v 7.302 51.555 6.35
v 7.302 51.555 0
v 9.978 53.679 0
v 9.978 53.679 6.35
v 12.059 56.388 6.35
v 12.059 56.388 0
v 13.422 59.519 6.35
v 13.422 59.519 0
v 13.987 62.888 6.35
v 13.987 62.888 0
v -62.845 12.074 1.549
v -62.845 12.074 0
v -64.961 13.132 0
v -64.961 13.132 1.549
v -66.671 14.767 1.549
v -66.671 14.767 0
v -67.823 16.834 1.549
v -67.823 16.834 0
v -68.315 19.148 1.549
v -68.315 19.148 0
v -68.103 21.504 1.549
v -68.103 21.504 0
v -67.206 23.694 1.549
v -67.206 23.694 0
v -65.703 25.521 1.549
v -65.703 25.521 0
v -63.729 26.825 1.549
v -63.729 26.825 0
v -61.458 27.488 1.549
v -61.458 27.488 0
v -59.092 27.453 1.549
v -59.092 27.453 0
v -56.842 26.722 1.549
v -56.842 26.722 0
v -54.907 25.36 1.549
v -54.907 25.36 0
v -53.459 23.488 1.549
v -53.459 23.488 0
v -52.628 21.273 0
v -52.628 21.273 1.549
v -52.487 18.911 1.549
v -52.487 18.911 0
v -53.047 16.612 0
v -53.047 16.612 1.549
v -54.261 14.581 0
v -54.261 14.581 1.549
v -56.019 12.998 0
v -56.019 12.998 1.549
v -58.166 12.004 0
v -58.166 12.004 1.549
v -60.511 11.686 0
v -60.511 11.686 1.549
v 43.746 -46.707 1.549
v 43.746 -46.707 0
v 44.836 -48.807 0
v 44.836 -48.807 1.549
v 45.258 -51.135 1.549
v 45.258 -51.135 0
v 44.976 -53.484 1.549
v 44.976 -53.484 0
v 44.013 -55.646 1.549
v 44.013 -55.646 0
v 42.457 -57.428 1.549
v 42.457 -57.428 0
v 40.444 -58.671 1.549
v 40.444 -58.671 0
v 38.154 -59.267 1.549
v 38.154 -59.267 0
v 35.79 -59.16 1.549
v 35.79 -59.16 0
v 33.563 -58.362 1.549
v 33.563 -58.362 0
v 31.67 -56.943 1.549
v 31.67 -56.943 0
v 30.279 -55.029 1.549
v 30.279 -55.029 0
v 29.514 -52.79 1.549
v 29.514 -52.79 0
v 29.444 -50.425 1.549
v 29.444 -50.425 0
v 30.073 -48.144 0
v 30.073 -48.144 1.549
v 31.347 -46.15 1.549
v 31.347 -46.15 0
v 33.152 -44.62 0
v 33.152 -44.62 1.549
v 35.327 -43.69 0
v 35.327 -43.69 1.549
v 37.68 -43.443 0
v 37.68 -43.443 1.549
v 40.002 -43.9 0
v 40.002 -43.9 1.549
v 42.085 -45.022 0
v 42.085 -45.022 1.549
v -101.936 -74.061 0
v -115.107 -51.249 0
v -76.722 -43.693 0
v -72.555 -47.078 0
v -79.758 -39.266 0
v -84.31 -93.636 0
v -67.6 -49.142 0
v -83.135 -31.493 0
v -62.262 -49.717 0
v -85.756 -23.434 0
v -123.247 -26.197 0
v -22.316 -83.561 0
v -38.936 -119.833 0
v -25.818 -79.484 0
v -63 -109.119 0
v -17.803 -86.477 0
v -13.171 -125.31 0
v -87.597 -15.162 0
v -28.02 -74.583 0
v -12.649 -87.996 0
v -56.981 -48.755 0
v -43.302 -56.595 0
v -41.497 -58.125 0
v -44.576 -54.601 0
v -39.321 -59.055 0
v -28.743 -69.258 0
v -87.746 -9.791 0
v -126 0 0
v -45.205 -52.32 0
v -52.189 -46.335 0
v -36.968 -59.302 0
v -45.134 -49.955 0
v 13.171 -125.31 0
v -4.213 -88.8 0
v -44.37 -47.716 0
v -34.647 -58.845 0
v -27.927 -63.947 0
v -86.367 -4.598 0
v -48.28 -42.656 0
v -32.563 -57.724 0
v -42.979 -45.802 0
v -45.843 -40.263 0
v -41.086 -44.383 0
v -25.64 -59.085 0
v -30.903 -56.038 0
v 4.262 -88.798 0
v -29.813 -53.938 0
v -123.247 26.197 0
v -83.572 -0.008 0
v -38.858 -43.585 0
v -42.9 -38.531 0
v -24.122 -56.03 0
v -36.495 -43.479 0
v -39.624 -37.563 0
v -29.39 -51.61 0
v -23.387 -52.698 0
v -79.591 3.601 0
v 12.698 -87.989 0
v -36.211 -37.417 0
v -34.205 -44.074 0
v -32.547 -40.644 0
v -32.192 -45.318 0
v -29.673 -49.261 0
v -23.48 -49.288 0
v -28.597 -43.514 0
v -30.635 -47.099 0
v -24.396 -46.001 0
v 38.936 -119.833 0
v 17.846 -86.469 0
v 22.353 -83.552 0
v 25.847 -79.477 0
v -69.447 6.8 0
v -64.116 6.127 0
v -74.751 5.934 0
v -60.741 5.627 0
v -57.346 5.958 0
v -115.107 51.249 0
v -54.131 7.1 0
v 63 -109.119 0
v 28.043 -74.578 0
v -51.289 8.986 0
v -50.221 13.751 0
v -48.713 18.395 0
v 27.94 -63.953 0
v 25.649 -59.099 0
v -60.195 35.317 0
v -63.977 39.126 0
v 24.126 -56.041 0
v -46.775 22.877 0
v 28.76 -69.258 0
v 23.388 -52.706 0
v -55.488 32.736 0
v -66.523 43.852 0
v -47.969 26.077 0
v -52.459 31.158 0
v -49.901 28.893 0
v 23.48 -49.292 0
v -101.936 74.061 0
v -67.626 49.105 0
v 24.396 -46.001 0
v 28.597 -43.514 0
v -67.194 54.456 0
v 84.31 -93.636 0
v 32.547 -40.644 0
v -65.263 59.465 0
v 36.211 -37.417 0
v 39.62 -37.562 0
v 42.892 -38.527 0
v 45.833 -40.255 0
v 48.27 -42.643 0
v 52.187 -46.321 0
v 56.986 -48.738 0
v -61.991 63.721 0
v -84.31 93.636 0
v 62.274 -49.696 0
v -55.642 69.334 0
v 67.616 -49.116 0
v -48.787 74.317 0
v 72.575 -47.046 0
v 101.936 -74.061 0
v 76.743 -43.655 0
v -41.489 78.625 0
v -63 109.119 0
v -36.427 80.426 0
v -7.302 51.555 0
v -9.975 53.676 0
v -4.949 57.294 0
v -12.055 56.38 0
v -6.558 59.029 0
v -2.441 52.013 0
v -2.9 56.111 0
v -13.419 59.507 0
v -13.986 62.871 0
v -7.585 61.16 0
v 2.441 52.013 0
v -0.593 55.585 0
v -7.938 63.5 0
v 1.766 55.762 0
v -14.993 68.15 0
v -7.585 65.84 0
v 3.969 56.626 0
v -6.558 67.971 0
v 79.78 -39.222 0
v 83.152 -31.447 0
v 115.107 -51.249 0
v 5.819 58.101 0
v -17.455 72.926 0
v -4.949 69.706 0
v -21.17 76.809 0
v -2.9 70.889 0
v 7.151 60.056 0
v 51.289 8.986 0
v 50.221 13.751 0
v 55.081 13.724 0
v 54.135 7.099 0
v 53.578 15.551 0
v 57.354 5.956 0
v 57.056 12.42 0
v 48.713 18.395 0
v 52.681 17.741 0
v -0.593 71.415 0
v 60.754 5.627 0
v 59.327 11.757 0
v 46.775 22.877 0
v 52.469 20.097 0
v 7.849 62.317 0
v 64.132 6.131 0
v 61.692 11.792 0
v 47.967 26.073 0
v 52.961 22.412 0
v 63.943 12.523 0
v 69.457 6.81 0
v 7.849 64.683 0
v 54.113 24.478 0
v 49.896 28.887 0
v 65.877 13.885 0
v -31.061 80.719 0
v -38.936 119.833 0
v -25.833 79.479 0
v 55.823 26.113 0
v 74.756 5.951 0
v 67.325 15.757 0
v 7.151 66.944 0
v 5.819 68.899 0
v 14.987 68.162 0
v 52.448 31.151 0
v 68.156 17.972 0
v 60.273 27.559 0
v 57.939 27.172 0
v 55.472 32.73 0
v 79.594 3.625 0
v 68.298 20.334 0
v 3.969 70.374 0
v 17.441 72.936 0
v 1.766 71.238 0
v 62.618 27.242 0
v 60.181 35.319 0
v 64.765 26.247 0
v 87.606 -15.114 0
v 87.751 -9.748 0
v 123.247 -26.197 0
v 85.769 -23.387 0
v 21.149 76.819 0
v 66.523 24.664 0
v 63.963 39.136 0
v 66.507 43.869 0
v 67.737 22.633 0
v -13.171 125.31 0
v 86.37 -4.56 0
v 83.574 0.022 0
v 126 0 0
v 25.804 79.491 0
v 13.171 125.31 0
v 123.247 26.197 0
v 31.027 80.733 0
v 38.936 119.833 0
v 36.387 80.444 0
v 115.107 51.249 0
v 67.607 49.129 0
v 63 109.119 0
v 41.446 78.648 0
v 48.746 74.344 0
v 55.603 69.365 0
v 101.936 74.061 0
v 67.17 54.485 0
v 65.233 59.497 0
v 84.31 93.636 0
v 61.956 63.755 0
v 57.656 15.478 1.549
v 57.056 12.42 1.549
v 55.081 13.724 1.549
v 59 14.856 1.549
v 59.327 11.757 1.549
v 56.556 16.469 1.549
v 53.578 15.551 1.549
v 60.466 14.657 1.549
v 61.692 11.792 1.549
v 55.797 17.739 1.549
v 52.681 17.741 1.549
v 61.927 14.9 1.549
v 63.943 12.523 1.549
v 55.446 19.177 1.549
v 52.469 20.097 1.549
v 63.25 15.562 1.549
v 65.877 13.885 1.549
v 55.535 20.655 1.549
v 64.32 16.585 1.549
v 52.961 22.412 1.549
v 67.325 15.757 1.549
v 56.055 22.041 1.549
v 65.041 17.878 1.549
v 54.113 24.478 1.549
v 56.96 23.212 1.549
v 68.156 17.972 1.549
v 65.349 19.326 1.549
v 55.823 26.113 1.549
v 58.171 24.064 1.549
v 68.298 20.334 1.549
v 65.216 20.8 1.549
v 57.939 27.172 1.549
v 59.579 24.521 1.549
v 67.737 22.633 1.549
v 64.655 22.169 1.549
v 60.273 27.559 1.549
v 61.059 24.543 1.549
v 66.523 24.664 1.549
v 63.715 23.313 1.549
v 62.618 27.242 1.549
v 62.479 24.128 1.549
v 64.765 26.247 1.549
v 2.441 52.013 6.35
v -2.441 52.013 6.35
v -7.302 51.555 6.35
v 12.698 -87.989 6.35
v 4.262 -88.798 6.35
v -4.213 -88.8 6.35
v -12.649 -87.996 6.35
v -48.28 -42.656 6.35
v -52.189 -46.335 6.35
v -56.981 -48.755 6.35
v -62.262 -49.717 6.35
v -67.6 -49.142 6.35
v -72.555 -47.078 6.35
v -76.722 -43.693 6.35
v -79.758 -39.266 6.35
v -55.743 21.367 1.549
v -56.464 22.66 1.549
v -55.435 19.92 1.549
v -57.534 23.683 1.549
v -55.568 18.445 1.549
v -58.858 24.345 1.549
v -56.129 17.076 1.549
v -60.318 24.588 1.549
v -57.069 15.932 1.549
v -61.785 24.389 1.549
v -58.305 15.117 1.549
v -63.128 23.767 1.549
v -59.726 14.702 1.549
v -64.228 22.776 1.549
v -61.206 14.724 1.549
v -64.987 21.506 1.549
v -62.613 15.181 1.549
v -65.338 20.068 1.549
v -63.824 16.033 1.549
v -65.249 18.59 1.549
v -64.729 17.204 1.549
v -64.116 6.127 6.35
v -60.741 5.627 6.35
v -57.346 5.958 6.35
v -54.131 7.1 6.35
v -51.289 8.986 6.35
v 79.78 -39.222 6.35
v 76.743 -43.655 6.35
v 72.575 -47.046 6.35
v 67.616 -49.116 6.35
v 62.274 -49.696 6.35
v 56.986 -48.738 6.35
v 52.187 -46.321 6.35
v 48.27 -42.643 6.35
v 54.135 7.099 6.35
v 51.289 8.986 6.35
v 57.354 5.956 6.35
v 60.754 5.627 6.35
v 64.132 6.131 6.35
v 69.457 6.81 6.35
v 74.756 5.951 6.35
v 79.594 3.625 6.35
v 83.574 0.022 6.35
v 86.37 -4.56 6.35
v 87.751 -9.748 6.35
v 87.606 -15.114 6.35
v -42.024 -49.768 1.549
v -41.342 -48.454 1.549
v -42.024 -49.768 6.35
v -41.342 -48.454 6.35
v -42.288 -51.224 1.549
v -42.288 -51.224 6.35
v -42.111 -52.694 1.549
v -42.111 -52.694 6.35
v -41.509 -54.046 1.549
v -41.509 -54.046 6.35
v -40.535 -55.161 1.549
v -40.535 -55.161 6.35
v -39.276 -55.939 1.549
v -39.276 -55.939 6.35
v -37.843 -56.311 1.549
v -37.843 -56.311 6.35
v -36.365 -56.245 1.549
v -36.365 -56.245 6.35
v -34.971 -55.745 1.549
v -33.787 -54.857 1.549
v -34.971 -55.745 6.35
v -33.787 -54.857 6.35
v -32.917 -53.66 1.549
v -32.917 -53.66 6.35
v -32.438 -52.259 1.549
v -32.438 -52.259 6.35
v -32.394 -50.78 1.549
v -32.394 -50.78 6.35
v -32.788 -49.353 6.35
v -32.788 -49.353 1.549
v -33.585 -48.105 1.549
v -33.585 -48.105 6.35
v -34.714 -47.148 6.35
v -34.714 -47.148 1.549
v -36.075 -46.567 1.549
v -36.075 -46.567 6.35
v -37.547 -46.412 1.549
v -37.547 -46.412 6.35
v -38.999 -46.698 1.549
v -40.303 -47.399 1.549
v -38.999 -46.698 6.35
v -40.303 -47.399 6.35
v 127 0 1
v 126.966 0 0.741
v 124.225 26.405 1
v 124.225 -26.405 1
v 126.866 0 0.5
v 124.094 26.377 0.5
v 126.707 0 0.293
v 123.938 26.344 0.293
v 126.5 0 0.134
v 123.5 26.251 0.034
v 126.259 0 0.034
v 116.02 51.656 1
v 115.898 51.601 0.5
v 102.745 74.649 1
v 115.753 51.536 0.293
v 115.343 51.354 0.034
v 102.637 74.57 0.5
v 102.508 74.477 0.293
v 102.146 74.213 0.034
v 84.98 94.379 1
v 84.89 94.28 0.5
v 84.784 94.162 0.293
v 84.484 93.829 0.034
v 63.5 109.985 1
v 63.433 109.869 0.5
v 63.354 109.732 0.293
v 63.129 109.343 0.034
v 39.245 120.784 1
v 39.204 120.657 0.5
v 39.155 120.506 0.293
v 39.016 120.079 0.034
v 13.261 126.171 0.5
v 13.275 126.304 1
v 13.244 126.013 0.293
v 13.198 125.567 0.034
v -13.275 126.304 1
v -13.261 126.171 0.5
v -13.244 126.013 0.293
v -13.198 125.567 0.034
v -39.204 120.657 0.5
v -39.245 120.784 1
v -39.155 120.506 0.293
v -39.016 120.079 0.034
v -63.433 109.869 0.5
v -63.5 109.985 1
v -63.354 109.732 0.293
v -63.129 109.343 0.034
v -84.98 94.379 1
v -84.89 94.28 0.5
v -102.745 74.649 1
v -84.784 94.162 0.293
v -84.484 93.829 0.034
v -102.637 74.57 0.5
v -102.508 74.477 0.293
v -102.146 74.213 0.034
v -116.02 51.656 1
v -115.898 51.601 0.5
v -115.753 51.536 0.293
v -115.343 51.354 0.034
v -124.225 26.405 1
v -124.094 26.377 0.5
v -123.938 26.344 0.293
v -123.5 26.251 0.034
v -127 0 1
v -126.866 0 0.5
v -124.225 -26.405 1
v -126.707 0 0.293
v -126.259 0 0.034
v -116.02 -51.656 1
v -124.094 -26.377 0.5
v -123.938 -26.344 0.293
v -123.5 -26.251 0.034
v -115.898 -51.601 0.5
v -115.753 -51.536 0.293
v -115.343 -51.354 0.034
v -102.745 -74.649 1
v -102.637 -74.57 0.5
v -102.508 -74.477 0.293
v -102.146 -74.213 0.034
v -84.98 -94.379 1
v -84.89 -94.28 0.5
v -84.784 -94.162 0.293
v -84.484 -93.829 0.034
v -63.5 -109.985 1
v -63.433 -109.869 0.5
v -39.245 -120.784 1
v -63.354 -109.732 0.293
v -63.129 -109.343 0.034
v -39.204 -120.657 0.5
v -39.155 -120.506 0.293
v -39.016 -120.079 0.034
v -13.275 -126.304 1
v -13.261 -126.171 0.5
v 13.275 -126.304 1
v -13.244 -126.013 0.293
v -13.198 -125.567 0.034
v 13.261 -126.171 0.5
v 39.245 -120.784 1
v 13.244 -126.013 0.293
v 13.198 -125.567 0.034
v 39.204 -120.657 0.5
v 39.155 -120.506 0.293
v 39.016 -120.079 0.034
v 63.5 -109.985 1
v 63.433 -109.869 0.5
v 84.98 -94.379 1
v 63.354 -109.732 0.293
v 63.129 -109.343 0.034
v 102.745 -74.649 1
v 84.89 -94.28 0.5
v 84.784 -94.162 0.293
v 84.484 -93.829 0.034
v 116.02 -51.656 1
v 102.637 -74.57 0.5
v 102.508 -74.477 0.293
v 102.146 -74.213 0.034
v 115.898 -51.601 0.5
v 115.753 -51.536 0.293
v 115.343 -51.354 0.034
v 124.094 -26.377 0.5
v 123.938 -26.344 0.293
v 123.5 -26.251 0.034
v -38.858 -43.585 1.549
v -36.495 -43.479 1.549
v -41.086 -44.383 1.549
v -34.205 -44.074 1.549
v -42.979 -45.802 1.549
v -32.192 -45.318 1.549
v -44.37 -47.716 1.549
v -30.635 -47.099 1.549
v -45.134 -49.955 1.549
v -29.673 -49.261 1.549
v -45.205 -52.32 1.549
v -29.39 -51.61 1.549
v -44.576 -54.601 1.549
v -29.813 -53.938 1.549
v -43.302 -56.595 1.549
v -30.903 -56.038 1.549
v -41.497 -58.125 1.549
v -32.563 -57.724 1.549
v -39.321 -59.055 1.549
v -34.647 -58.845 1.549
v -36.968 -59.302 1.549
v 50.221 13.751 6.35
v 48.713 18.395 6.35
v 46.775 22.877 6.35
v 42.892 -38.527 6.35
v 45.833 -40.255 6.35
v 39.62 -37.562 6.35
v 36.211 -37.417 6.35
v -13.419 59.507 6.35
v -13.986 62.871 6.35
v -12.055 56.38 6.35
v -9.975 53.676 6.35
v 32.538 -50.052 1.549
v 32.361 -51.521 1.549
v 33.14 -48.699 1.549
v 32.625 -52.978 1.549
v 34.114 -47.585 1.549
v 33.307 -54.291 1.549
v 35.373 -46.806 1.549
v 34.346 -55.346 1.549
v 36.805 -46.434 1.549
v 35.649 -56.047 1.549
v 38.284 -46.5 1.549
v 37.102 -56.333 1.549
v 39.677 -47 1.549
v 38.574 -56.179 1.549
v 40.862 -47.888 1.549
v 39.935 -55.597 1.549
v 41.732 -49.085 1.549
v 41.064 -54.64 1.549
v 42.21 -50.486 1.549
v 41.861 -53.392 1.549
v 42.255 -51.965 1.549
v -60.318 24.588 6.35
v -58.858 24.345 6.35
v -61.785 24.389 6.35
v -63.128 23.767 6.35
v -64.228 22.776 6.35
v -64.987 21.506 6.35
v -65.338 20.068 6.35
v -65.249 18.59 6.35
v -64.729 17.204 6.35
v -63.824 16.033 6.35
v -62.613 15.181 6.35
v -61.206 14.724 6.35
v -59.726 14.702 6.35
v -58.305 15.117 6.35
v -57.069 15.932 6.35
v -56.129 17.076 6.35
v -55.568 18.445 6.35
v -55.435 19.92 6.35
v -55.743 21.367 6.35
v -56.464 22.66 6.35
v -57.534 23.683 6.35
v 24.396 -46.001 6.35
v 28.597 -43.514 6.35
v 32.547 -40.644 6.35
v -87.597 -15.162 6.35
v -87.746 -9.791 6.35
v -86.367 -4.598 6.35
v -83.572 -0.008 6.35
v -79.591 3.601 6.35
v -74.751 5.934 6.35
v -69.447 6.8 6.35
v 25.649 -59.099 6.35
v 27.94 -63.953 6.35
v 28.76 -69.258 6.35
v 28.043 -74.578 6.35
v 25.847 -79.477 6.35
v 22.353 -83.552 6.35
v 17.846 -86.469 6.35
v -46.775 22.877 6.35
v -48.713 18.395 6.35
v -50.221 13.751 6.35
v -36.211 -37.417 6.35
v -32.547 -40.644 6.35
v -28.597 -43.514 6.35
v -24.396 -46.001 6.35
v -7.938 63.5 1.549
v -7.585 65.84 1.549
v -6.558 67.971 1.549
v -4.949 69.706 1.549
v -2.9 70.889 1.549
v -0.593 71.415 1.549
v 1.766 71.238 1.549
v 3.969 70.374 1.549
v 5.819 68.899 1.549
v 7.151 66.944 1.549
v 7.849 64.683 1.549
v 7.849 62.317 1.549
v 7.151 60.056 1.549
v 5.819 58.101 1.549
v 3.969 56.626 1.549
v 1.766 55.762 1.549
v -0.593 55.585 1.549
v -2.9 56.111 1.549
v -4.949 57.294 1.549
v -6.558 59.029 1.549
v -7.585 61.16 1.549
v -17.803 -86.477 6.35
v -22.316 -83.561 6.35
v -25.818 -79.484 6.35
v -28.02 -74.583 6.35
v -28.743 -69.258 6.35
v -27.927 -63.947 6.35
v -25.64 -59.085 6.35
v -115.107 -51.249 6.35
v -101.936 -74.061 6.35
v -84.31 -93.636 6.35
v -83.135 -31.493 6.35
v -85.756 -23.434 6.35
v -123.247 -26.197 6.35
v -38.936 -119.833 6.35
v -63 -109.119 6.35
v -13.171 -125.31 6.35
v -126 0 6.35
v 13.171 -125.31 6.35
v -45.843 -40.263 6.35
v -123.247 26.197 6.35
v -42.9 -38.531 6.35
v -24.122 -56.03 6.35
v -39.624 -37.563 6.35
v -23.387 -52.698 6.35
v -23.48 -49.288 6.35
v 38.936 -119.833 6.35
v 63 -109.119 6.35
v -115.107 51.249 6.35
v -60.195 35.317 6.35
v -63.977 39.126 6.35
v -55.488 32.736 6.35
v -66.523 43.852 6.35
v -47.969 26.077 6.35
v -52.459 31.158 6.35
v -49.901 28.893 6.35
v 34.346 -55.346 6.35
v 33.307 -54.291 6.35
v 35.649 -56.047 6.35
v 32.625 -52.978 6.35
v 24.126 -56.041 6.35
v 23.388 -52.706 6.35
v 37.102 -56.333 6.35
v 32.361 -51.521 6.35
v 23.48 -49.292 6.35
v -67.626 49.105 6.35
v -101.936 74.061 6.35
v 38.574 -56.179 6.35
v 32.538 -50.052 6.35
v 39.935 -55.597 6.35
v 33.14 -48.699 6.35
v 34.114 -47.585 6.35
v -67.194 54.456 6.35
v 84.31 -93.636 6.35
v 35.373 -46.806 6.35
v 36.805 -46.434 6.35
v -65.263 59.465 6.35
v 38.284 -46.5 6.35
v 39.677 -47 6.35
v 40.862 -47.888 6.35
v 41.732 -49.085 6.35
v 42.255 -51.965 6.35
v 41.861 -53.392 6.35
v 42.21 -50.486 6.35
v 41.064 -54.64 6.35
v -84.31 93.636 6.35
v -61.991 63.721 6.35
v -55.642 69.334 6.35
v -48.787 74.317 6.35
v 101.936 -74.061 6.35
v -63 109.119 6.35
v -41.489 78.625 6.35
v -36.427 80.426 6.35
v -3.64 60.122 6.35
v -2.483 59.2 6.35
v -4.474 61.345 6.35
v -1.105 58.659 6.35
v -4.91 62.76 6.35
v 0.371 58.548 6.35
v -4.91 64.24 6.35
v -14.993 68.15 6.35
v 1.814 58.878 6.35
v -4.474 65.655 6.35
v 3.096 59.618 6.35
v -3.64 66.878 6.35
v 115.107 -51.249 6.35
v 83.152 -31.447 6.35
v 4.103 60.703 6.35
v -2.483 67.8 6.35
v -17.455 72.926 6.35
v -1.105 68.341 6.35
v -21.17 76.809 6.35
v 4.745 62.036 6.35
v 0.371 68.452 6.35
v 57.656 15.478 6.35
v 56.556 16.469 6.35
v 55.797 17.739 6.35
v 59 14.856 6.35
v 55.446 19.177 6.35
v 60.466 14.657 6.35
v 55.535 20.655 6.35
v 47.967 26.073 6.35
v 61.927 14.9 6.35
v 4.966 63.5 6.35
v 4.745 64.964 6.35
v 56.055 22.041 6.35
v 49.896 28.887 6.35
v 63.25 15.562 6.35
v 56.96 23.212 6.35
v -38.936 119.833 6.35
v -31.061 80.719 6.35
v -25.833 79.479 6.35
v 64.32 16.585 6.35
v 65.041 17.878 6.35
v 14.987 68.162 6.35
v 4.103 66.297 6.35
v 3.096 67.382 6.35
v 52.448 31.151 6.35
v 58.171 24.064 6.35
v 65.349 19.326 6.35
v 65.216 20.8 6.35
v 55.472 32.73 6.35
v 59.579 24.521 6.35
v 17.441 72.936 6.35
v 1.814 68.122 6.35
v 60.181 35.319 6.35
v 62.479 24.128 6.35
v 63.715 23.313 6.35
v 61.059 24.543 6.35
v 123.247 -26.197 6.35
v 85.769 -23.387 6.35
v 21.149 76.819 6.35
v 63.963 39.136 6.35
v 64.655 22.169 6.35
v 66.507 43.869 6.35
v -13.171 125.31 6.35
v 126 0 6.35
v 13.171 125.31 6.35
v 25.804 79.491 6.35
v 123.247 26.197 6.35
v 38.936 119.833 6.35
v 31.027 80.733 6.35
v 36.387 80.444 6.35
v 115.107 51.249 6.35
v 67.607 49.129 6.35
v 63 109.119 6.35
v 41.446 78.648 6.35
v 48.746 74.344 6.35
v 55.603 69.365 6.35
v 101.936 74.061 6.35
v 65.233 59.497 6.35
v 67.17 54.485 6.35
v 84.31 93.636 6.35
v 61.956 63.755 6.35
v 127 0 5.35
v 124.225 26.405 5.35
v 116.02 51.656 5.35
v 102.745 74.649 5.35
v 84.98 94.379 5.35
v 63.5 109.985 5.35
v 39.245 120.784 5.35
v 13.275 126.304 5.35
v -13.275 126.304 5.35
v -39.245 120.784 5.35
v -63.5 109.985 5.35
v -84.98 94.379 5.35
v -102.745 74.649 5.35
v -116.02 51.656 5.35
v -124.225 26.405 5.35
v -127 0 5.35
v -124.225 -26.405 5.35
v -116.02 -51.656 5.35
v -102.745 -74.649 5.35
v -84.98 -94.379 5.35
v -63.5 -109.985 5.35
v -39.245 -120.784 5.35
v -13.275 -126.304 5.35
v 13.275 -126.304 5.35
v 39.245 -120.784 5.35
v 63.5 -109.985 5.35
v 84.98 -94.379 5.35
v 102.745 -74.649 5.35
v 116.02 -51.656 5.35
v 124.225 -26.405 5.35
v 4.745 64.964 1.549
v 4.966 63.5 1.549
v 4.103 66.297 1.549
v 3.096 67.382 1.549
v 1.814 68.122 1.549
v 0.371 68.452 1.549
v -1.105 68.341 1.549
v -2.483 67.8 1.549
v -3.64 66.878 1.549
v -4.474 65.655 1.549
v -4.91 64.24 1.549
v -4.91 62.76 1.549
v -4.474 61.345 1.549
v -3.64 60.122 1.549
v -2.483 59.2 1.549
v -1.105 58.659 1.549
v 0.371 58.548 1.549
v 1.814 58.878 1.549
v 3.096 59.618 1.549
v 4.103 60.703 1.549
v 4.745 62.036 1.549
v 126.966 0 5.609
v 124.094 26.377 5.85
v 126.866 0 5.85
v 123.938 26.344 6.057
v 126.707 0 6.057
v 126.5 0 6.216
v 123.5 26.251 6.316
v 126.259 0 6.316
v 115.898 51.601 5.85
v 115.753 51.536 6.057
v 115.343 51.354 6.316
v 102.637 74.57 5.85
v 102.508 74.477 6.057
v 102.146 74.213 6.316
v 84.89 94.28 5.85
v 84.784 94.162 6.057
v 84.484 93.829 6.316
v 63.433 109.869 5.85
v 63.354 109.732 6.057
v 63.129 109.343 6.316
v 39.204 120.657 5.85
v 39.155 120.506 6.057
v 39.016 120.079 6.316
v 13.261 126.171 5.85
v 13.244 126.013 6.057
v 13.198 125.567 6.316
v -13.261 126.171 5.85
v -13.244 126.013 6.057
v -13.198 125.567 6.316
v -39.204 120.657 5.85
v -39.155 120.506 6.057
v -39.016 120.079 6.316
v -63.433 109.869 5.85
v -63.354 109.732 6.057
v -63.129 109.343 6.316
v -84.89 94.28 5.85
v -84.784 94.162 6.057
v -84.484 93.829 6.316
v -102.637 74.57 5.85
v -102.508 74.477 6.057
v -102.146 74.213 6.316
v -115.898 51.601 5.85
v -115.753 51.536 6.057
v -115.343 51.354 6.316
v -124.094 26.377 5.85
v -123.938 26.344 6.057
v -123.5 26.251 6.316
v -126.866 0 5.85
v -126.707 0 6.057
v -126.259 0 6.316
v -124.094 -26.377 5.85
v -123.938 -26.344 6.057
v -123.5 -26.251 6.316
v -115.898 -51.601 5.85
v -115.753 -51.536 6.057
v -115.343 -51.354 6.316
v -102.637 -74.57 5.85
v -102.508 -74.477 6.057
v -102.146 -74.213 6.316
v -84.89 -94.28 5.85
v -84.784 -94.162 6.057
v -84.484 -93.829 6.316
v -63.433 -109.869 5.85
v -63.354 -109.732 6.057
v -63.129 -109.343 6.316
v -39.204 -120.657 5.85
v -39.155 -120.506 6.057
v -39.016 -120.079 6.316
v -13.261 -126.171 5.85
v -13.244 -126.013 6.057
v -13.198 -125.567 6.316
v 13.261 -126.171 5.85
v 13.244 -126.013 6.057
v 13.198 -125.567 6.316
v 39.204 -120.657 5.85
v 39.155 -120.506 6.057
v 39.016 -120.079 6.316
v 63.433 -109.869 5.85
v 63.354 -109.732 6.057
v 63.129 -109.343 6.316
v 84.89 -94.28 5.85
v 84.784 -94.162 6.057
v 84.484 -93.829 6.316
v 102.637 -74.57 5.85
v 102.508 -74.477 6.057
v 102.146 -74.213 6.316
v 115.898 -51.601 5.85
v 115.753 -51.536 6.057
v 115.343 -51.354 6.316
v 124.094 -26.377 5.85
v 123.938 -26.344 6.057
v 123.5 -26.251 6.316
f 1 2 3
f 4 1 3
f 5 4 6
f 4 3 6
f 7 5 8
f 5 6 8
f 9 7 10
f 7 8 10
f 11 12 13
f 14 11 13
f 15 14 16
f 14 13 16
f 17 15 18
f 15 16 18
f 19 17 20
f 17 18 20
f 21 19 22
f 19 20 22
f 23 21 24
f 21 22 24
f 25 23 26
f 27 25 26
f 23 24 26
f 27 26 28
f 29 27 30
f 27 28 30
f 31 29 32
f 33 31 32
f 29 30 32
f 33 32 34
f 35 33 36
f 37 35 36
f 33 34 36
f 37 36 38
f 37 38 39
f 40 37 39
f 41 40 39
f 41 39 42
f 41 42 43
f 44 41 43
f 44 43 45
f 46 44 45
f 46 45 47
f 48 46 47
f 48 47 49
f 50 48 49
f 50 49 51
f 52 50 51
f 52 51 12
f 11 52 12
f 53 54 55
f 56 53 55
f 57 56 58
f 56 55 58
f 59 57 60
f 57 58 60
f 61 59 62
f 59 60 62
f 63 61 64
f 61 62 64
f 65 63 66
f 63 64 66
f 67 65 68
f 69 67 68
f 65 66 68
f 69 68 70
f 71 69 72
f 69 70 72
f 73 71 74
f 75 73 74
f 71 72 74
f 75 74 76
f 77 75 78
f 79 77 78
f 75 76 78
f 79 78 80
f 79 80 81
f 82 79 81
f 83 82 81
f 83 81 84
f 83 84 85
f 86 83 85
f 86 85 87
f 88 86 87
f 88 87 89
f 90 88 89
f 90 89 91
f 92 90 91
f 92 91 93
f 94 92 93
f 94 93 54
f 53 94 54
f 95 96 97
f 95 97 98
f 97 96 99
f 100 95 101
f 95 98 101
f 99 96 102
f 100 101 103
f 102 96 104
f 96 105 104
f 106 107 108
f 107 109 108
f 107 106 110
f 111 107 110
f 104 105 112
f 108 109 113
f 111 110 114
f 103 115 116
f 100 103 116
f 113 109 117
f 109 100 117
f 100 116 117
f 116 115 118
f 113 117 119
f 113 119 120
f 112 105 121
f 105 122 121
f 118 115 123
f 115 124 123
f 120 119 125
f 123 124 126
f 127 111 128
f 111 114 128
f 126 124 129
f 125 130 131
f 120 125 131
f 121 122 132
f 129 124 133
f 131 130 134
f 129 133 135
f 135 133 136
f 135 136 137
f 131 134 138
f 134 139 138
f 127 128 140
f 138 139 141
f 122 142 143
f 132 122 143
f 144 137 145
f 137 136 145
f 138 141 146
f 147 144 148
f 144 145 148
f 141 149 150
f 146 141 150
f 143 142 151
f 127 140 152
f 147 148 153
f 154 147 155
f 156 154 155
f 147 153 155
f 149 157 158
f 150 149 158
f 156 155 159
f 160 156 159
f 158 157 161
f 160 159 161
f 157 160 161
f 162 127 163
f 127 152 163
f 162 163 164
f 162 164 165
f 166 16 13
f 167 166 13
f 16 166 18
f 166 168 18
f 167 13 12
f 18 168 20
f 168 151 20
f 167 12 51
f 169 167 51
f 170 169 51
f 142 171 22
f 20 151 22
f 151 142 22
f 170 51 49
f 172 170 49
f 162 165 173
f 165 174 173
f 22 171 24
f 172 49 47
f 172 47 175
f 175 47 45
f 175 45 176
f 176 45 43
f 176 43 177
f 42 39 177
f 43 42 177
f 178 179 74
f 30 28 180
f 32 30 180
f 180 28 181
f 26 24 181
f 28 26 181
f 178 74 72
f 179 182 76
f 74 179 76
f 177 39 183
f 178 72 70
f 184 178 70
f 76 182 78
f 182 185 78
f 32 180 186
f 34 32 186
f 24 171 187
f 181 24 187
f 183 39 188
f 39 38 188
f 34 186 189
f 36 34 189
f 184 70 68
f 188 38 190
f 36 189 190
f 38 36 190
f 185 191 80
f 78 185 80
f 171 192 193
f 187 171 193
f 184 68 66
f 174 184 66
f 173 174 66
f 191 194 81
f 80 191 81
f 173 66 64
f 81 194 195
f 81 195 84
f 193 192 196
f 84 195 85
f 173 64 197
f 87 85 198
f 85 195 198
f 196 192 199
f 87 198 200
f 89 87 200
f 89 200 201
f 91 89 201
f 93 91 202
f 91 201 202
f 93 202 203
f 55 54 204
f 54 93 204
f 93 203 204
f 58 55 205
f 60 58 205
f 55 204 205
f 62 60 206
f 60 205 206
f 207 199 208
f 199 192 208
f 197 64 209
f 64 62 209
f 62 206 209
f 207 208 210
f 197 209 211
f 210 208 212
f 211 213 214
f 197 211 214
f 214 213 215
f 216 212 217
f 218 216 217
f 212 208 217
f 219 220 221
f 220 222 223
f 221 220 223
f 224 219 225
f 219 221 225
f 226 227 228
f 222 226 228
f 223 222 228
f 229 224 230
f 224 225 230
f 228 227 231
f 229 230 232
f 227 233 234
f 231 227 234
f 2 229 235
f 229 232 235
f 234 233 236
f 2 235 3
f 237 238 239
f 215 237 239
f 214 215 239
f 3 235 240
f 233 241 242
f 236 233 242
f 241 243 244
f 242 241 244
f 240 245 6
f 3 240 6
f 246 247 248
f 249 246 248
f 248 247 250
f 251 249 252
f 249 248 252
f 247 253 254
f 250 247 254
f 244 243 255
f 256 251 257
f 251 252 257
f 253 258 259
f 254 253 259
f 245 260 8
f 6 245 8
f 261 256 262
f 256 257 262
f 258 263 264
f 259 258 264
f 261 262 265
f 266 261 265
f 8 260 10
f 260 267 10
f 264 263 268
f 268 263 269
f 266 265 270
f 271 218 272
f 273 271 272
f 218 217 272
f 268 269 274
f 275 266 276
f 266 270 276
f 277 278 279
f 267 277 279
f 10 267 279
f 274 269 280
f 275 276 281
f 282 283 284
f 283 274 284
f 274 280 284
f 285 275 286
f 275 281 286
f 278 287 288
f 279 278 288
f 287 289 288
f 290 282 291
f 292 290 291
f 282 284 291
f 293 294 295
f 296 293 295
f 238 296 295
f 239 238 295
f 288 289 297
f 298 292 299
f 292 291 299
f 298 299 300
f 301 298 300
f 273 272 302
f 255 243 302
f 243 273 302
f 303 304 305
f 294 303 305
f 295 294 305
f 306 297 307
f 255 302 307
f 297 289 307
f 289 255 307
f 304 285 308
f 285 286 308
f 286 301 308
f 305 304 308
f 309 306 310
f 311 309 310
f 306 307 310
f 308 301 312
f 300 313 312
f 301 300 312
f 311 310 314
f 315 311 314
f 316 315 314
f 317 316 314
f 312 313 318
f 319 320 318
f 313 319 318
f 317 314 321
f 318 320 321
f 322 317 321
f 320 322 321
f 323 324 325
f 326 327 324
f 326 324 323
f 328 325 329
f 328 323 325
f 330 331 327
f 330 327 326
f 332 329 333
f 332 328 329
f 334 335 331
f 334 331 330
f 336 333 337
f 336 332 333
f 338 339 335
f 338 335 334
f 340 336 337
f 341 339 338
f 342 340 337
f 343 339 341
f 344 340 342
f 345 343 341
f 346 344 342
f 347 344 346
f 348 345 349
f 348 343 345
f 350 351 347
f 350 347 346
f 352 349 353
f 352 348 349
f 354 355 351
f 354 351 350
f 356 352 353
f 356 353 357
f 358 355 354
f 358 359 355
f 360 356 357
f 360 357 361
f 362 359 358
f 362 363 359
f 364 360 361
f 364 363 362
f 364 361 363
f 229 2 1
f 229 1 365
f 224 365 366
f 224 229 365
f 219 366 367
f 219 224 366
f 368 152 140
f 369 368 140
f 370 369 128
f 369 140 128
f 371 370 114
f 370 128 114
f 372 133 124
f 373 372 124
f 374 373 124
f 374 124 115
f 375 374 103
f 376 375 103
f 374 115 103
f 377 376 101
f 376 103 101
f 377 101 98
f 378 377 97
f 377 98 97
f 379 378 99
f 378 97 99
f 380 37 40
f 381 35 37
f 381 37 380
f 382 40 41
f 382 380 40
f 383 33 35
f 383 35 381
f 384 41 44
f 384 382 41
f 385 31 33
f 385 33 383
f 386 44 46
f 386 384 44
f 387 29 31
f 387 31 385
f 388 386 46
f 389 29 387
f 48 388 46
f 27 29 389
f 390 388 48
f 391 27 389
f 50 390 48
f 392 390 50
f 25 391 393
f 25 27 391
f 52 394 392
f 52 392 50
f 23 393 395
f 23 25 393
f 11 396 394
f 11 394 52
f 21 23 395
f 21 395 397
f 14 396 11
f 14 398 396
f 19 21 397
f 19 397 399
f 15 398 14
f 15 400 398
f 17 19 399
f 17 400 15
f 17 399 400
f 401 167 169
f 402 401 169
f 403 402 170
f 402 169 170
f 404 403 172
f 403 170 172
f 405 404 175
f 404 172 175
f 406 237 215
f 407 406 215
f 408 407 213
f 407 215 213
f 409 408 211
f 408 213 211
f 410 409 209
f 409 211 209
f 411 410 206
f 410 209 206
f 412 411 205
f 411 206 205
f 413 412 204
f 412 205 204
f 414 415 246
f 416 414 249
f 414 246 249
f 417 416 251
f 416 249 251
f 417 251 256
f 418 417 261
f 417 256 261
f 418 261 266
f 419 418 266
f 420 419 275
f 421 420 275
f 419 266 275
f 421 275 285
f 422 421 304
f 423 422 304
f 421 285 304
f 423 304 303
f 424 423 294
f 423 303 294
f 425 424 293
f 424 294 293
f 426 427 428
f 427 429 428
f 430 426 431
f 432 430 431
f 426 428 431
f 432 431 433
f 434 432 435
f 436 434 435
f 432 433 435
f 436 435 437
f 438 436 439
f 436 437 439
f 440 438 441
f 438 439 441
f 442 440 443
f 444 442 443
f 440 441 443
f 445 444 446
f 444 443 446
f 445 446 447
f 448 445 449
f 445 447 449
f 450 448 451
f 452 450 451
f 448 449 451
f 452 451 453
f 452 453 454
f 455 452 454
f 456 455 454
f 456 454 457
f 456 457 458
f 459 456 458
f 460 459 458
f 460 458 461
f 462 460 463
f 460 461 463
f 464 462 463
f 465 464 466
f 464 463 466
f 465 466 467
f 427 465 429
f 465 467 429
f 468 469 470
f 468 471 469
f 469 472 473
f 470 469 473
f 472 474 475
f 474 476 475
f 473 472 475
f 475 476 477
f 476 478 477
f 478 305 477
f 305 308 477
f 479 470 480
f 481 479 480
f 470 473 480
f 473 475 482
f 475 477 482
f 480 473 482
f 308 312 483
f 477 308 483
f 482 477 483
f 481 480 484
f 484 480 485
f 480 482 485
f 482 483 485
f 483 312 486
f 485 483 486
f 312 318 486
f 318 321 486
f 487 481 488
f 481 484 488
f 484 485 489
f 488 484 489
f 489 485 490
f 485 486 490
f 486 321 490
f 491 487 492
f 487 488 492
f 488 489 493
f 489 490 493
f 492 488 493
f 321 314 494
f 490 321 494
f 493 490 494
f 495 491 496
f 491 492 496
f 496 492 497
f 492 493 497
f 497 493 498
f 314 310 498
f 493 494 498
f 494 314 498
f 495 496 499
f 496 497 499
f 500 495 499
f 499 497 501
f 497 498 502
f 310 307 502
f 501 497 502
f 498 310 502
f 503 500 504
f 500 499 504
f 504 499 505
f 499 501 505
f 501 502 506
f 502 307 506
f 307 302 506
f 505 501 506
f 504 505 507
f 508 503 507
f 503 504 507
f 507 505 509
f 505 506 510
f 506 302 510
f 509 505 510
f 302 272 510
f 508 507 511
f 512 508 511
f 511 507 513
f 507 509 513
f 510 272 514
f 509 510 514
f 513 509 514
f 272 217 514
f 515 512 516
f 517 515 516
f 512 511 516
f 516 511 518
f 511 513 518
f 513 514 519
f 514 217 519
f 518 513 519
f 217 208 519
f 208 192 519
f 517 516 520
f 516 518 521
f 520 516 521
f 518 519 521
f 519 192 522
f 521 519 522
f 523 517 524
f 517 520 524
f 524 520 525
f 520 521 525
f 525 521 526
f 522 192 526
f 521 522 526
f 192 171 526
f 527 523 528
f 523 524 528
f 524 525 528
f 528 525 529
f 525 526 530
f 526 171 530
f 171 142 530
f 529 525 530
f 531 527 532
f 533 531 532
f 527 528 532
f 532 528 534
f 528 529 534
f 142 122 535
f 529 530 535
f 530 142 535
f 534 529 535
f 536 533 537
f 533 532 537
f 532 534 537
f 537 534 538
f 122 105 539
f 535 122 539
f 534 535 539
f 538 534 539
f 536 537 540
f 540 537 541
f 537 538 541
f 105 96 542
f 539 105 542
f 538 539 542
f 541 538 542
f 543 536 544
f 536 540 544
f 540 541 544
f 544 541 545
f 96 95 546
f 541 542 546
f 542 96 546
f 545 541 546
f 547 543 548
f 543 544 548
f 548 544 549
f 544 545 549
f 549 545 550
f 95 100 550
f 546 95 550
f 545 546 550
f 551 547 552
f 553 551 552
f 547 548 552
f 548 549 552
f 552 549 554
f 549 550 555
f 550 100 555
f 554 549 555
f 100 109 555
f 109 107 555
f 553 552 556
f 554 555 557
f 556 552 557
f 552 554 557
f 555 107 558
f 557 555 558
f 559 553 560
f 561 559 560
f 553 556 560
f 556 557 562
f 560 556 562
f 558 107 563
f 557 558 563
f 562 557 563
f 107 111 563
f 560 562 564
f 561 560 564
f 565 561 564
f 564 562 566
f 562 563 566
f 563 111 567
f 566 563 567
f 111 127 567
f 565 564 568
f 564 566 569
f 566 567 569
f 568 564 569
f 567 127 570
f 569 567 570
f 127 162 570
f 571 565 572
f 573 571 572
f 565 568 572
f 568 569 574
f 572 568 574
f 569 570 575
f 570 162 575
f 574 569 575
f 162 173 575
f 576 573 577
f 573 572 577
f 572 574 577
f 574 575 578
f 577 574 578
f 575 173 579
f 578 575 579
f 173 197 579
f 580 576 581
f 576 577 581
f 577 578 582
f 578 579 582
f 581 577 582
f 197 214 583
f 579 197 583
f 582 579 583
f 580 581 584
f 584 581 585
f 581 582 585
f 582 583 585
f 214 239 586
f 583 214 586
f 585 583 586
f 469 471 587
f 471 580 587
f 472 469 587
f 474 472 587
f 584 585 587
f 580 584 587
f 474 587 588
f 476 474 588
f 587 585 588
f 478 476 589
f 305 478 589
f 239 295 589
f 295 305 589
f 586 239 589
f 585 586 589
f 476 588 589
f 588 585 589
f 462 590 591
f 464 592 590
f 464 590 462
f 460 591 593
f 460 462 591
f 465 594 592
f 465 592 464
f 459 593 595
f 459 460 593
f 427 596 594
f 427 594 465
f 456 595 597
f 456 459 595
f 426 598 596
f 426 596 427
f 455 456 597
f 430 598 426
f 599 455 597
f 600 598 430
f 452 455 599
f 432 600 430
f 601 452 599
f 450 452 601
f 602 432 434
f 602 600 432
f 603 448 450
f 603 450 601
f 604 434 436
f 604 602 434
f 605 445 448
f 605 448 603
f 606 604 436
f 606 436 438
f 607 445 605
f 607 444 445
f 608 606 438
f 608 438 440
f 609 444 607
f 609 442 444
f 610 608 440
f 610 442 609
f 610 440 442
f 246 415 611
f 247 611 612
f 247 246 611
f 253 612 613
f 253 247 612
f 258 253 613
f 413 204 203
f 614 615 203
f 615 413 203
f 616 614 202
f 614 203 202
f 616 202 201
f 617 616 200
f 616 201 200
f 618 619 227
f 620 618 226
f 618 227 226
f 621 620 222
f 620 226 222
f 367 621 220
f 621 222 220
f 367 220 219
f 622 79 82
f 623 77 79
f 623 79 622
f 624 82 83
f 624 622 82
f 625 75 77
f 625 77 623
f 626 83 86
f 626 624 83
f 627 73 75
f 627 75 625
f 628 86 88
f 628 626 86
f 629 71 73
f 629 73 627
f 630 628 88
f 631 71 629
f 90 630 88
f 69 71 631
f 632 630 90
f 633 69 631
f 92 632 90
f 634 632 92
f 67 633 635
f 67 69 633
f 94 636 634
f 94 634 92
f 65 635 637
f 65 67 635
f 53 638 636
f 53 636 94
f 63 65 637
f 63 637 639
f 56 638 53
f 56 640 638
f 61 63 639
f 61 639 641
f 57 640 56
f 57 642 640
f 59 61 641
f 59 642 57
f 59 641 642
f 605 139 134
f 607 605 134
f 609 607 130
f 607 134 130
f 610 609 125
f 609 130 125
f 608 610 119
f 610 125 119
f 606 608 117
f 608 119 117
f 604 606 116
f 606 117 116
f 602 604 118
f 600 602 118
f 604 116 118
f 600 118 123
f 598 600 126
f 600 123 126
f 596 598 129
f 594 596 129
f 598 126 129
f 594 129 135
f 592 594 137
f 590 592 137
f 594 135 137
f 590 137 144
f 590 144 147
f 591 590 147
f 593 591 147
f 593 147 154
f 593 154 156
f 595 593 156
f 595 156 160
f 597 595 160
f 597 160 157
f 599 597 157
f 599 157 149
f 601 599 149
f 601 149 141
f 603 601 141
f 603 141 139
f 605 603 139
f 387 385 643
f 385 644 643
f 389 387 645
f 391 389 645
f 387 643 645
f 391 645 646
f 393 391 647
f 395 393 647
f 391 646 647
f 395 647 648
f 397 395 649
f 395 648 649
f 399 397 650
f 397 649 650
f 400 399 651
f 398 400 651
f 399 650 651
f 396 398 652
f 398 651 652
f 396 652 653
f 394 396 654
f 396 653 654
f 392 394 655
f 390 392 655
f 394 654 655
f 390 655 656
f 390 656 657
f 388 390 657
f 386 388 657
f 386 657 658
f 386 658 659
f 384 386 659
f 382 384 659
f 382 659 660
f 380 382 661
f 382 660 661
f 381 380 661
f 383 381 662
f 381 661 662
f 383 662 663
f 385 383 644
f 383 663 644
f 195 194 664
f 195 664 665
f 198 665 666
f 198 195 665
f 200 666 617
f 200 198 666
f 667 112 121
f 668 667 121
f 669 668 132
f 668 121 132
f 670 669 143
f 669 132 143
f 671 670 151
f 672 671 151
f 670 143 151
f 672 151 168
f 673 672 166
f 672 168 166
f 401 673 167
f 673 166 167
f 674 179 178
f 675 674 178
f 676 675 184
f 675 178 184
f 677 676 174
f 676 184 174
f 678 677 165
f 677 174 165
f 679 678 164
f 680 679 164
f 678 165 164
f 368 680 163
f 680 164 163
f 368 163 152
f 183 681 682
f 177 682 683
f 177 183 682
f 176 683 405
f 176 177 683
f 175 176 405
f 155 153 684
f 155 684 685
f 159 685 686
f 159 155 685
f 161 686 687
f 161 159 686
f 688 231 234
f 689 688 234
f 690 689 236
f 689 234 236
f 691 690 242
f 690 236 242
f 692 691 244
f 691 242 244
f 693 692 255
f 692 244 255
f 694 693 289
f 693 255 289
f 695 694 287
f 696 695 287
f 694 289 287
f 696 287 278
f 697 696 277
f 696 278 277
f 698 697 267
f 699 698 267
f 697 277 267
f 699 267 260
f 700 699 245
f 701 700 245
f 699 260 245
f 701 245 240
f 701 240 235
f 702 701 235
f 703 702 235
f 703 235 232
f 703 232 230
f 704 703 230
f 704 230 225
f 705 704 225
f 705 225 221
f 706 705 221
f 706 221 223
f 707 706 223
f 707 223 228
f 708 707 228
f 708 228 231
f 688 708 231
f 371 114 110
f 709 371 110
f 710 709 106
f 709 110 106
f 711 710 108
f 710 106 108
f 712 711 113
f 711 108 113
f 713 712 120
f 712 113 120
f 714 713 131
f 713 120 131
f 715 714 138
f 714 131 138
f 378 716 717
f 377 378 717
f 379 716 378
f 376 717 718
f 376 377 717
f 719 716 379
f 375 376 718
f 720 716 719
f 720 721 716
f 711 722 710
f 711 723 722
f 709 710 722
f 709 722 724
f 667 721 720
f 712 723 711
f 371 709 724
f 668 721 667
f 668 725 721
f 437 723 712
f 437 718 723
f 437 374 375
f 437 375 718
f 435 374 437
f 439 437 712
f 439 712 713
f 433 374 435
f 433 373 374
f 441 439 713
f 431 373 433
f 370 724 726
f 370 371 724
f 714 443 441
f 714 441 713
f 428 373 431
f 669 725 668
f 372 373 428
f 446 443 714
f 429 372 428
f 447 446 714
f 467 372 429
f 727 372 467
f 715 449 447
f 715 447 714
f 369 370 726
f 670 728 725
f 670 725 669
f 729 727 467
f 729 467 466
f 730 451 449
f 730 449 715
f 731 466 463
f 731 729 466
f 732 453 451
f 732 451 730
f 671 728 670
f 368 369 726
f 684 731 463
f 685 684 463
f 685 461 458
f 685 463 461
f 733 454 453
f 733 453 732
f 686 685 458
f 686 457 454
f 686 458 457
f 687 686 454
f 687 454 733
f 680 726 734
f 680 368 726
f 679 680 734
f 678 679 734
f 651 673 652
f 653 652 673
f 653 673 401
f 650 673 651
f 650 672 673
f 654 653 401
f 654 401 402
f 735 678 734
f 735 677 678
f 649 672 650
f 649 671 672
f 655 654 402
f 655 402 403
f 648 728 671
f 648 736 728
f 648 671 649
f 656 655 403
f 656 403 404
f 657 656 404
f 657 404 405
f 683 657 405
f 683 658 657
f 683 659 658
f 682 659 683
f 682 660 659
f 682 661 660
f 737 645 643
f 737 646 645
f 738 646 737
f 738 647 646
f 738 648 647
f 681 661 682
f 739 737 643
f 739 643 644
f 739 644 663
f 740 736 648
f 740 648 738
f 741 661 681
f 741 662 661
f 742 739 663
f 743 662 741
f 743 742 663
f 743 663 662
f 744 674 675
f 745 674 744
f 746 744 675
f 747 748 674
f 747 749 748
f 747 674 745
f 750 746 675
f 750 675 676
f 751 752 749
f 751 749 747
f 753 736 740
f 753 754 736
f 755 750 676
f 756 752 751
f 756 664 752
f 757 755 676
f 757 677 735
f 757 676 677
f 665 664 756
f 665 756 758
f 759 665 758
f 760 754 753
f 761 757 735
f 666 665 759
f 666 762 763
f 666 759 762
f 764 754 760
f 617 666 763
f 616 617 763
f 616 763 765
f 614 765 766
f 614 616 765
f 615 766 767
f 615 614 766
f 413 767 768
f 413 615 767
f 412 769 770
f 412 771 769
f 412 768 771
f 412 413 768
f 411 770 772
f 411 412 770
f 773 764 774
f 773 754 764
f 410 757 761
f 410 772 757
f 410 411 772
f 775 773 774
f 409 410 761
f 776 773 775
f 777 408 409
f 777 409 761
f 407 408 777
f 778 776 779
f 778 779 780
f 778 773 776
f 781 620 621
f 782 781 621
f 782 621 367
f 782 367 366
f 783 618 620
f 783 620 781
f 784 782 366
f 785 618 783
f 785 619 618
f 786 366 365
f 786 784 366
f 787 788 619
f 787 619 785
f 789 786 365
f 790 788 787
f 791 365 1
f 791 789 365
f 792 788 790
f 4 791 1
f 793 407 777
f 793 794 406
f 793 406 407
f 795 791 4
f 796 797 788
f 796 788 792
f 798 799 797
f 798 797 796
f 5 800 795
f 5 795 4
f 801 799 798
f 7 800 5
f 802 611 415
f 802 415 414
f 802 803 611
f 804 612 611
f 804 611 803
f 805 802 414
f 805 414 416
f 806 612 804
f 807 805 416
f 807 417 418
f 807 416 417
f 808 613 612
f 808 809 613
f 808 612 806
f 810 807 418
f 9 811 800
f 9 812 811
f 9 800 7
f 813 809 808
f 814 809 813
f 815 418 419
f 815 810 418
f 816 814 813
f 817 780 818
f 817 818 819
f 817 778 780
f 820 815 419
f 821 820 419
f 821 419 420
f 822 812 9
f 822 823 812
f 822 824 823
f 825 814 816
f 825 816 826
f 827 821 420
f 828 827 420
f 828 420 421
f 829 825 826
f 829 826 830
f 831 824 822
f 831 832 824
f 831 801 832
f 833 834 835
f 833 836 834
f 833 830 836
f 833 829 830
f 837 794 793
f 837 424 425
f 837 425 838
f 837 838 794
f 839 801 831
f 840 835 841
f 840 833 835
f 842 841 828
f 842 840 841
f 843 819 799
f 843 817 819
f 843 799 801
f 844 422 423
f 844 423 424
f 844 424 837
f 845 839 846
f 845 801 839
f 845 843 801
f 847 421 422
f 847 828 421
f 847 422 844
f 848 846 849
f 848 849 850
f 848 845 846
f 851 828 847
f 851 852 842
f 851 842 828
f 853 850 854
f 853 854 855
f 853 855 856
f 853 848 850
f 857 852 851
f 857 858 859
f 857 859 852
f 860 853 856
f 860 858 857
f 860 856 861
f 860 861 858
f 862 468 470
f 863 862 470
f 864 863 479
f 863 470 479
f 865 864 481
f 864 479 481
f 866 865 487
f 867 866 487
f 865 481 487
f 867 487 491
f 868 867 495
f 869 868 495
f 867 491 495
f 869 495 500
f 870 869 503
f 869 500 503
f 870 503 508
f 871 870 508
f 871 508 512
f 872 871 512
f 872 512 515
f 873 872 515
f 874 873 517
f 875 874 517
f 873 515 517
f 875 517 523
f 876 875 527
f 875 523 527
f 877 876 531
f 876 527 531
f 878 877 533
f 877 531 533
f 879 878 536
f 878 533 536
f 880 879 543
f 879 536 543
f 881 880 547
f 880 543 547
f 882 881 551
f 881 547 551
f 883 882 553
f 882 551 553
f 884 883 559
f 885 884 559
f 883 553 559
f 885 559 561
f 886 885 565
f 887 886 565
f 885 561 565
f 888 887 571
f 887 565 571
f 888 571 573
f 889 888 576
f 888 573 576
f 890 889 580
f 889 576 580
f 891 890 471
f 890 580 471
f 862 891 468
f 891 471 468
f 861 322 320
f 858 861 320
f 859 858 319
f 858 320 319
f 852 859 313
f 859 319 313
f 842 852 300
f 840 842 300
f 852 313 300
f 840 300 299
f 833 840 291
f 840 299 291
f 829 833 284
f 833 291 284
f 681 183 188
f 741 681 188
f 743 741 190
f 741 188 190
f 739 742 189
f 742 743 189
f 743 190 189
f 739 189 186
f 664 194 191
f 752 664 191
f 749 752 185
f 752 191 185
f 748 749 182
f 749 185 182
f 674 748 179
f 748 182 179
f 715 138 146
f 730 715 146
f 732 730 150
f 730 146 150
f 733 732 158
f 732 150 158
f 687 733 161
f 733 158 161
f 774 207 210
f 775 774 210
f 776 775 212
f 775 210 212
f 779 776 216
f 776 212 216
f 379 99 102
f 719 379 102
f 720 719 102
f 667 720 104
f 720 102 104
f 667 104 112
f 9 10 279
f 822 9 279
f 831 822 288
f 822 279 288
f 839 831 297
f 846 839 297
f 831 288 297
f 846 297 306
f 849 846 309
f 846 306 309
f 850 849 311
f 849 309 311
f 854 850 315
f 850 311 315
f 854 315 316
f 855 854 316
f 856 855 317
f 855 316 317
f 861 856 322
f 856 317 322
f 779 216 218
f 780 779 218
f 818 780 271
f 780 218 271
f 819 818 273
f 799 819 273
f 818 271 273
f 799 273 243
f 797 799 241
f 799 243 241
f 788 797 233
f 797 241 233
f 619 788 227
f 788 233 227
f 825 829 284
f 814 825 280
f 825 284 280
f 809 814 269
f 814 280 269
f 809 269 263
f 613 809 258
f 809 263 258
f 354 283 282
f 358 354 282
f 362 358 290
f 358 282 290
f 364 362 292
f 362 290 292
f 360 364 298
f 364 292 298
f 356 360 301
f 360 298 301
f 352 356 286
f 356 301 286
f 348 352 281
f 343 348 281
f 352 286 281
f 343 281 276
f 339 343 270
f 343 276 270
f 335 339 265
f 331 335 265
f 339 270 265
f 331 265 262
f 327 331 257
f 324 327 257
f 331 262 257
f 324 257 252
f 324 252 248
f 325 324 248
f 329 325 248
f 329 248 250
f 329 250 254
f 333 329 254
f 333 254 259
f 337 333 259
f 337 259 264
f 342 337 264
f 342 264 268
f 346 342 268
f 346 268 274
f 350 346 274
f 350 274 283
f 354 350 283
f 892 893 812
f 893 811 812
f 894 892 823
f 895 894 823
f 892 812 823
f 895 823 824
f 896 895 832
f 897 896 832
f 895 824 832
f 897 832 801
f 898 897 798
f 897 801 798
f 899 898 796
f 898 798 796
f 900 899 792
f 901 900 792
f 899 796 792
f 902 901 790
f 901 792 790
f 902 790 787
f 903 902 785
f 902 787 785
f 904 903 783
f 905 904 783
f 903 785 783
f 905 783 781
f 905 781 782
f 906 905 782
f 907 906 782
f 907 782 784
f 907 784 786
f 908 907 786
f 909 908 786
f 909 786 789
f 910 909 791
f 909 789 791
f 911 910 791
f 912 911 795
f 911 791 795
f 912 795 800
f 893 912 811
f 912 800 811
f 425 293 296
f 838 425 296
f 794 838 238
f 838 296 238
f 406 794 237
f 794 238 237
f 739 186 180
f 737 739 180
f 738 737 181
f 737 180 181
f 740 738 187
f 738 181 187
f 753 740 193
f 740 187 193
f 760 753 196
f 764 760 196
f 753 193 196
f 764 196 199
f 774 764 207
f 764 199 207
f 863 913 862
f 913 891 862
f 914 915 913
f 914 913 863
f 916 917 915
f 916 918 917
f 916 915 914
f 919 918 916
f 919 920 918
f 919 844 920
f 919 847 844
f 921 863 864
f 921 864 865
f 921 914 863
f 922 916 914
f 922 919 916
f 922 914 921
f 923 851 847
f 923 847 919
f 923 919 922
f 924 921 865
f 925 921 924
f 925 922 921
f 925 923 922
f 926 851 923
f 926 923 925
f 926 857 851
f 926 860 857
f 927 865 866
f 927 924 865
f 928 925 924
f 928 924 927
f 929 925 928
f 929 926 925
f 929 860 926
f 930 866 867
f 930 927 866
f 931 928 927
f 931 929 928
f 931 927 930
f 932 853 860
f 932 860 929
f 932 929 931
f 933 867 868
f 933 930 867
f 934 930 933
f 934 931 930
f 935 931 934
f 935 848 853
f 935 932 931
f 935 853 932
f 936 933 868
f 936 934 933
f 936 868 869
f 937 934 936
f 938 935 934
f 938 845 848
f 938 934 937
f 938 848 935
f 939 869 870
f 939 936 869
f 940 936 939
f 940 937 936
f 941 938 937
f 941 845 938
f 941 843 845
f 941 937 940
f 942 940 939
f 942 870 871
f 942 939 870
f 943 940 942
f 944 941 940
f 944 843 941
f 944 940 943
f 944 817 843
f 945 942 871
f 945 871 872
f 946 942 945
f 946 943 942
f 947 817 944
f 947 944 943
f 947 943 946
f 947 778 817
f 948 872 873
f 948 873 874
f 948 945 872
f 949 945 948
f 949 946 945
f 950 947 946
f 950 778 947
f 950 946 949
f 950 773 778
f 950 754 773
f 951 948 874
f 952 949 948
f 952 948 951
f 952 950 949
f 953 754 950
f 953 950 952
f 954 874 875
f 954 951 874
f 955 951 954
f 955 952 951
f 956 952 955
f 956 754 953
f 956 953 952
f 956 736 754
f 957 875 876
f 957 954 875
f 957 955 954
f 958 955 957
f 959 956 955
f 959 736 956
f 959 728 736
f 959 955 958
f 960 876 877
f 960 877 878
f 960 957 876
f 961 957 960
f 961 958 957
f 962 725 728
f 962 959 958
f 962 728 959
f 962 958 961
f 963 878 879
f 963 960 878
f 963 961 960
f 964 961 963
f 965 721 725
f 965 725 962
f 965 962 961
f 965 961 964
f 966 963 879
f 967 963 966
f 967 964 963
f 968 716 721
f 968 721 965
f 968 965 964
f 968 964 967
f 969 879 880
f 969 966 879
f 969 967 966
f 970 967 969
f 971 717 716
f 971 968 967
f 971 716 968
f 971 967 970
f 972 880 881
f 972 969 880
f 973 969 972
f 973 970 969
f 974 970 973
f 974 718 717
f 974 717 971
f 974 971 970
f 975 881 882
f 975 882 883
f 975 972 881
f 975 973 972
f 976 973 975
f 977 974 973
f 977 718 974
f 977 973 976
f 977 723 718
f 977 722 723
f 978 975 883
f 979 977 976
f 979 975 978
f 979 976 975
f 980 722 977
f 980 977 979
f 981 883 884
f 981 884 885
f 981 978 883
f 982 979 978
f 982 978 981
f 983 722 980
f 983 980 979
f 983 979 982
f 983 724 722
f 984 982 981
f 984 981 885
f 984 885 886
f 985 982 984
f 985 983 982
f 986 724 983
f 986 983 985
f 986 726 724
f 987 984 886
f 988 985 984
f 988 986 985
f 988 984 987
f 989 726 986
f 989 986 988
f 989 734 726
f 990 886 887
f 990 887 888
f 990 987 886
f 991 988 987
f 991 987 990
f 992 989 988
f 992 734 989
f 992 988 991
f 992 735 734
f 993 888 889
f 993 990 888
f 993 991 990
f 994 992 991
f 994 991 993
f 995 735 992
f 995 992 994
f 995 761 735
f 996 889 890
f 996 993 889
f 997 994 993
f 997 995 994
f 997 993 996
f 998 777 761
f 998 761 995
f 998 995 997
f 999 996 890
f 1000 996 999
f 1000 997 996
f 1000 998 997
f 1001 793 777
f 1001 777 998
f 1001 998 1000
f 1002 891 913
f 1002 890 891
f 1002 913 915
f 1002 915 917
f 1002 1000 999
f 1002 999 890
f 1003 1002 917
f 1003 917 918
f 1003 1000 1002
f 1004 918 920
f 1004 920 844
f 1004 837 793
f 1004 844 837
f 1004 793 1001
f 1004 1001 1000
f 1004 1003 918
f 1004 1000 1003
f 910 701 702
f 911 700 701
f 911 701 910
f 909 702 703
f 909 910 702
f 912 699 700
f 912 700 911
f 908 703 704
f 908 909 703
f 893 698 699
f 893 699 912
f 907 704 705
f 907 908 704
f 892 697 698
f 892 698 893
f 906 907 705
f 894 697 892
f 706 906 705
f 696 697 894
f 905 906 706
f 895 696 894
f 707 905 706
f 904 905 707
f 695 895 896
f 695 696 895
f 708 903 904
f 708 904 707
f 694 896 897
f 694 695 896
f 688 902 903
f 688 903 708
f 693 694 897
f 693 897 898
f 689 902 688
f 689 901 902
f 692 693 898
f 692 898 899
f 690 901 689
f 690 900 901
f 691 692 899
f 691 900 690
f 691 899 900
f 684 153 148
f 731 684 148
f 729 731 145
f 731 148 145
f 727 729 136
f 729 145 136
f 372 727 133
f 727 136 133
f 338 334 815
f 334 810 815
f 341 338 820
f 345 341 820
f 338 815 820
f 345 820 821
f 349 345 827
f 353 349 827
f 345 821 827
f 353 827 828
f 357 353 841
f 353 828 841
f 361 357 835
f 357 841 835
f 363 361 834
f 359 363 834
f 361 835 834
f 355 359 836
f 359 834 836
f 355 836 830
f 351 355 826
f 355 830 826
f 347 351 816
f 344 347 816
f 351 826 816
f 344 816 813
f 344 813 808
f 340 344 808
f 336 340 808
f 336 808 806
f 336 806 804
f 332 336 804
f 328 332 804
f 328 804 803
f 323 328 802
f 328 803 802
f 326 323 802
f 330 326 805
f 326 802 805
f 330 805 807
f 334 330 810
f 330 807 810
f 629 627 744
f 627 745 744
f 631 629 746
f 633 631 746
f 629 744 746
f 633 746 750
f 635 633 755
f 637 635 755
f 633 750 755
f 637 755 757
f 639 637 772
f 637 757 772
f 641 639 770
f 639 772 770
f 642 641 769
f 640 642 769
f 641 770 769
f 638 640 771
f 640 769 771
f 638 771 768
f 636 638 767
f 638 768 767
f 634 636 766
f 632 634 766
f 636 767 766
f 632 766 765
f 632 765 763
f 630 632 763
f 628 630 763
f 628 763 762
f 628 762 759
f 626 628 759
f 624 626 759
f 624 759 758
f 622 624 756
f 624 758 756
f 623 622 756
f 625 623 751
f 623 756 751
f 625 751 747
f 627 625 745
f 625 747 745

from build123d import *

# Parameters (mm, degrees)
SKETCH1_R                                        = 127
SKETCH1_R_2                                      = 52.07
BOSS_EXTRUDE1_DEPTH                              = 6.35
CBORE_FOR_3_8_SOCKET_HEAD_CAP_SCREW1_D           = 9.9314
CBORE_FOR_3_8_SOCKET_HEAD_CAP_SCREW1_CBORE_D     = 15.875
CBORE_FOR_3_8_SOCKET_HEAD_CAP_SCREW1_CBORE_DEPTH = 1.5494
CIRPATTERN1_COUNT                                = 5
CUT_EXTRUDE1_DEPTH                               = 180.717340566
FILLET1_R                                        = 1


with BuildPart() as part:
    # Sketch1 → Boss-Extrude1 (new body)
    with BuildSketch(Plane.XY):
        Circle(SKETCH1_R)
        Circle(SKETCH1_R_2, mode=Mode.SUBTRACT)
    extrude(amount=BOSS_EXTRUDE1_DEPTH)

    # CBORE for 3/8 Socket Head Cap Screw1 (through all)
    with Locations(Plane(origin=(0, 0, 0), x_dir=(-1, 0, 0), z_dir=(0, 0, -1))):
        with Locations((0, 63.5)):
            cbore_for_3_8_socket_head_cap_screw1 = CounterBoreHole(CBORE_FOR_3_8_SOCKET_HEAD_CAP_SCREW1_D / 2, CBORE_FOR_3_8_SOCKET_HEAD_CAP_SCREW1_CBORE_D / 2, CBORE_FOR_3_8_SOCKET_HEAD_CAP_SCREW1_CBORE_DEPTH)

    # CirPattern1: CBORE for 3/8 Socket Head Cap Screw1 ×5 about axis
    cirpattern1_axis = Axis((0, 0, 0), (0, 0, 1))
    for i in range(1, CIRPATTERN1_COUNT):
        add(cbore_for_3_8_socket_head_cap_screw1.rotate(cirpattern1_axis, i * 360 / CIRPATTERN1_COUNT), mode=Mode.SUBTRACT)

    # Sketch5 → Cut-Extrude1 (cut, through all)
    with BuildSketch(Plane(origin=(0, 0, 0), x_dir=(-1, 0, 0), z_dir=(0, 0, -1))):
        with BuildLine():
            ThreePointArc((-41.44563977, 78.647752314), (-52.234106188, 71.936139393), (-61.955600498, 63.755106203))
            ThreePointArc((-61.955600498, 63.755106203), (-67.246233615, 46.459424342), (-55.472312316, 32.729668808))
            ThreePointArc((-55.472312316, 32.729668808), (-49.895894595, 28.887022327), (-46.775498841, 22.876573349))
            ThreePointArc((-46.775498841, 22.876573349), (-49.521512803, 16.090514897), (-51.28868592, 8.986411775))
            ThreePointArc((-51.28868592, 8.986411775), (-57.354131533, 5.956167187), (-64.132133316, 6.131394358))
            ThreePointArc((-64.132133316, 6.131394358), (-81.713776835, 1.96678681), (-87.605864362, -15.11365374))
            ThreePointArc((-87.605864362, -15.11365374), (-84.556560625, -27.448097481), (-79.780042652, -39.22186628))
            ThreePointArc((-79.780042652, -39.22186628), (-64.965767259, -49.598217006), (-48.269652019, -42.64328022))
            ThreePointArc((-48.269652019, -42.64328022), (-42.8918702, -38.527234874), (-36.211338216, -37.416893037))
            ThreePointArc((-36.211338216, -37.416893037), (-30.605978087, -42.125514897), (-24.395661045, -46.001485))
            ThreePointArc((-24.395661045, -46.001485), (-23.388052957, -52.706463648), (-25.649221638, -59.098578238))
            ThreePointArc((-25.649221638, -59.098578238), (-27.121471128, -77.106649381), (-12.69776202, -87.98850402))
            ThreePointArc((-12.69776202, -87.98850402), (-0.02472225, -88.899996562), (12.648822515, -87.995552666))
            ThreePointArc((12.648822515, -87.995552666), (27.095181344, -77.112808233), (25.640026743, -59.084665376))
            ThreePointArc((25.640026743, -59.084665376), (23.38726097, -52.698162972), (24.395661045, -46.001485))
            ThreePointArc((24.395661045, -46.001485), (30.605978087, -42.125514897), (36.211338216, -37.416893037))
            ThreePointArc((36.211338216, -37.416893037), (42.899519875, -38.530553149), (48.280042559, -42.656324396))
            ThreePointArc((48.280042559, -42.656324396), (64.951785852, -49.621316886), (79.758215853, -39.266232363))
            ThreePointArc((79.758215853, -39.266232363), (84.541281434, -27.495121994), (87.597444884, -15.162376126))
            ThreePointArc((87.597444884, -15.162376126), (81.711510261, 1.939880549), (64.116060019, 6.126948804))
            ThreePointArc((64.116060019, 6.126948804), (57.345992383, 5.957979013), (51.28868592, 8.986411775))
            ThreePointArc((51.28868592, 8.986411775), (49.521512803, 16.090514897), (46.775498841, 22.876573349))
            ThreePointArc((46.775498841, 22.876573349), (49.901414341, 28.893272197), (55.487928918, 32.735519927))
            ThreePointArc((55.487928918, 32.735519927), (67.263882415, 46.438988979), (61.991050299, 63.720637809))
            ThreePointArc((61.991050299, 63.720637809), (52.274107628, 71.907076645), (41.48937575, 78.62468887))
            ThreePointArc((41.48937575, 78.62468887), (23.405309269, 78.311720347), (13.985877573, 62.871327984))
            ThreePointArc((13.985877573, 62.871327984), (12.054511442, 56.380396507), (7.302490092, 51.555392913))
            ThreePointArc((7.302490092, 51.555392913), (0, 52.07), (-7.302490092, 51.555392913))
            ThreePointArc((-7.302490092, 51.555392913), (-12.058749726, 56.387577413), (-13.986616522, 62.88798835))
            ThreePointArc((-13.986616522, 62.88798835), (-23.380420305, 78.322190478), (-41.44563977, 78.647752314))
        make_face()
    extrude(amount=-CUT_EXTRUDE1_DEPTH, mode=Mode.SUBTRACT)

    # Fillet1
    fillet1_edges = [part.edges().sort_by_distance(p)[0] for p in [
        (-127, 0, 0),
        (-127, 0, 6.35),
    ]]
    fillet(fillet1_edges, radius=FILLET1_R)


solid = part.part
